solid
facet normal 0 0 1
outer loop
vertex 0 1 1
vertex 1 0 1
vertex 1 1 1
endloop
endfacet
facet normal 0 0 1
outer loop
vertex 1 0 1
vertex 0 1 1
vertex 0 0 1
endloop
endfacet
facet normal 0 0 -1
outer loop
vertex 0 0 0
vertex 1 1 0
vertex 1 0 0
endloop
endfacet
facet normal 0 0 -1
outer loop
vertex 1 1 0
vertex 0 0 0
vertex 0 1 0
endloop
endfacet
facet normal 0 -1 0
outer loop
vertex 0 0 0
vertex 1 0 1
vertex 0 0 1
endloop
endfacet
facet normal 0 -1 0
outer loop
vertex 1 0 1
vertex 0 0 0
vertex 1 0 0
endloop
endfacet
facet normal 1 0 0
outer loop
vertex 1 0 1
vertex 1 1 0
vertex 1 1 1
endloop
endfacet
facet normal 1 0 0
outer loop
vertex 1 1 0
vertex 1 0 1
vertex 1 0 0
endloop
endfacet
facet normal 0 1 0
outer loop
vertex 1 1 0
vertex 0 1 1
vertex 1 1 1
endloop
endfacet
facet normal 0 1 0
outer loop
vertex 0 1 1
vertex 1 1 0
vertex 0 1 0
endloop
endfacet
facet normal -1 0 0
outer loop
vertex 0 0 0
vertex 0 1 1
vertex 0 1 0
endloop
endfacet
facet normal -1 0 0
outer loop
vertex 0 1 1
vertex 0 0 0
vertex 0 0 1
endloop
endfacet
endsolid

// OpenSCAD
cube(1);

regular  = "regular global";
$special = "special global";
module show() echo("         in show    ", regular,"   ", $special );

echo ("         outside    ", regular,"   ", $special );
          // ECHO: "         outside    ", "regular global", "   ", "special global"
  
for ( regular = [0:1] ){ echo("in regular loop     ", regular,"   ", $special ); show();}
          // ECHO: "in regular loop     ", 0, "   ", "special global"
          // ECHO: "         in show    ", "regular global", "   ", "special global"
          // ECHO: "in regular loop     ", 1, "   ", "special global"
          // ECHO: "         in show    ", "regular global", "   ", "special global"

for ( $special = [5:6] ){ echo("in special loop     ", regular,"   ", $special ); show();}
          // ECHO: "in special loop     ", "regular global", "   ", 5
          // ECHO: "         in show    ", "regular global", "   ", 5
          // ECHO: "in special loop     ", "regular global", "   ", 6
          // ECHO: "         in show    ", "regular global", "   ", 6

show();
          // ECHO: "         in show    ", "regular global", "   ", "special global"
